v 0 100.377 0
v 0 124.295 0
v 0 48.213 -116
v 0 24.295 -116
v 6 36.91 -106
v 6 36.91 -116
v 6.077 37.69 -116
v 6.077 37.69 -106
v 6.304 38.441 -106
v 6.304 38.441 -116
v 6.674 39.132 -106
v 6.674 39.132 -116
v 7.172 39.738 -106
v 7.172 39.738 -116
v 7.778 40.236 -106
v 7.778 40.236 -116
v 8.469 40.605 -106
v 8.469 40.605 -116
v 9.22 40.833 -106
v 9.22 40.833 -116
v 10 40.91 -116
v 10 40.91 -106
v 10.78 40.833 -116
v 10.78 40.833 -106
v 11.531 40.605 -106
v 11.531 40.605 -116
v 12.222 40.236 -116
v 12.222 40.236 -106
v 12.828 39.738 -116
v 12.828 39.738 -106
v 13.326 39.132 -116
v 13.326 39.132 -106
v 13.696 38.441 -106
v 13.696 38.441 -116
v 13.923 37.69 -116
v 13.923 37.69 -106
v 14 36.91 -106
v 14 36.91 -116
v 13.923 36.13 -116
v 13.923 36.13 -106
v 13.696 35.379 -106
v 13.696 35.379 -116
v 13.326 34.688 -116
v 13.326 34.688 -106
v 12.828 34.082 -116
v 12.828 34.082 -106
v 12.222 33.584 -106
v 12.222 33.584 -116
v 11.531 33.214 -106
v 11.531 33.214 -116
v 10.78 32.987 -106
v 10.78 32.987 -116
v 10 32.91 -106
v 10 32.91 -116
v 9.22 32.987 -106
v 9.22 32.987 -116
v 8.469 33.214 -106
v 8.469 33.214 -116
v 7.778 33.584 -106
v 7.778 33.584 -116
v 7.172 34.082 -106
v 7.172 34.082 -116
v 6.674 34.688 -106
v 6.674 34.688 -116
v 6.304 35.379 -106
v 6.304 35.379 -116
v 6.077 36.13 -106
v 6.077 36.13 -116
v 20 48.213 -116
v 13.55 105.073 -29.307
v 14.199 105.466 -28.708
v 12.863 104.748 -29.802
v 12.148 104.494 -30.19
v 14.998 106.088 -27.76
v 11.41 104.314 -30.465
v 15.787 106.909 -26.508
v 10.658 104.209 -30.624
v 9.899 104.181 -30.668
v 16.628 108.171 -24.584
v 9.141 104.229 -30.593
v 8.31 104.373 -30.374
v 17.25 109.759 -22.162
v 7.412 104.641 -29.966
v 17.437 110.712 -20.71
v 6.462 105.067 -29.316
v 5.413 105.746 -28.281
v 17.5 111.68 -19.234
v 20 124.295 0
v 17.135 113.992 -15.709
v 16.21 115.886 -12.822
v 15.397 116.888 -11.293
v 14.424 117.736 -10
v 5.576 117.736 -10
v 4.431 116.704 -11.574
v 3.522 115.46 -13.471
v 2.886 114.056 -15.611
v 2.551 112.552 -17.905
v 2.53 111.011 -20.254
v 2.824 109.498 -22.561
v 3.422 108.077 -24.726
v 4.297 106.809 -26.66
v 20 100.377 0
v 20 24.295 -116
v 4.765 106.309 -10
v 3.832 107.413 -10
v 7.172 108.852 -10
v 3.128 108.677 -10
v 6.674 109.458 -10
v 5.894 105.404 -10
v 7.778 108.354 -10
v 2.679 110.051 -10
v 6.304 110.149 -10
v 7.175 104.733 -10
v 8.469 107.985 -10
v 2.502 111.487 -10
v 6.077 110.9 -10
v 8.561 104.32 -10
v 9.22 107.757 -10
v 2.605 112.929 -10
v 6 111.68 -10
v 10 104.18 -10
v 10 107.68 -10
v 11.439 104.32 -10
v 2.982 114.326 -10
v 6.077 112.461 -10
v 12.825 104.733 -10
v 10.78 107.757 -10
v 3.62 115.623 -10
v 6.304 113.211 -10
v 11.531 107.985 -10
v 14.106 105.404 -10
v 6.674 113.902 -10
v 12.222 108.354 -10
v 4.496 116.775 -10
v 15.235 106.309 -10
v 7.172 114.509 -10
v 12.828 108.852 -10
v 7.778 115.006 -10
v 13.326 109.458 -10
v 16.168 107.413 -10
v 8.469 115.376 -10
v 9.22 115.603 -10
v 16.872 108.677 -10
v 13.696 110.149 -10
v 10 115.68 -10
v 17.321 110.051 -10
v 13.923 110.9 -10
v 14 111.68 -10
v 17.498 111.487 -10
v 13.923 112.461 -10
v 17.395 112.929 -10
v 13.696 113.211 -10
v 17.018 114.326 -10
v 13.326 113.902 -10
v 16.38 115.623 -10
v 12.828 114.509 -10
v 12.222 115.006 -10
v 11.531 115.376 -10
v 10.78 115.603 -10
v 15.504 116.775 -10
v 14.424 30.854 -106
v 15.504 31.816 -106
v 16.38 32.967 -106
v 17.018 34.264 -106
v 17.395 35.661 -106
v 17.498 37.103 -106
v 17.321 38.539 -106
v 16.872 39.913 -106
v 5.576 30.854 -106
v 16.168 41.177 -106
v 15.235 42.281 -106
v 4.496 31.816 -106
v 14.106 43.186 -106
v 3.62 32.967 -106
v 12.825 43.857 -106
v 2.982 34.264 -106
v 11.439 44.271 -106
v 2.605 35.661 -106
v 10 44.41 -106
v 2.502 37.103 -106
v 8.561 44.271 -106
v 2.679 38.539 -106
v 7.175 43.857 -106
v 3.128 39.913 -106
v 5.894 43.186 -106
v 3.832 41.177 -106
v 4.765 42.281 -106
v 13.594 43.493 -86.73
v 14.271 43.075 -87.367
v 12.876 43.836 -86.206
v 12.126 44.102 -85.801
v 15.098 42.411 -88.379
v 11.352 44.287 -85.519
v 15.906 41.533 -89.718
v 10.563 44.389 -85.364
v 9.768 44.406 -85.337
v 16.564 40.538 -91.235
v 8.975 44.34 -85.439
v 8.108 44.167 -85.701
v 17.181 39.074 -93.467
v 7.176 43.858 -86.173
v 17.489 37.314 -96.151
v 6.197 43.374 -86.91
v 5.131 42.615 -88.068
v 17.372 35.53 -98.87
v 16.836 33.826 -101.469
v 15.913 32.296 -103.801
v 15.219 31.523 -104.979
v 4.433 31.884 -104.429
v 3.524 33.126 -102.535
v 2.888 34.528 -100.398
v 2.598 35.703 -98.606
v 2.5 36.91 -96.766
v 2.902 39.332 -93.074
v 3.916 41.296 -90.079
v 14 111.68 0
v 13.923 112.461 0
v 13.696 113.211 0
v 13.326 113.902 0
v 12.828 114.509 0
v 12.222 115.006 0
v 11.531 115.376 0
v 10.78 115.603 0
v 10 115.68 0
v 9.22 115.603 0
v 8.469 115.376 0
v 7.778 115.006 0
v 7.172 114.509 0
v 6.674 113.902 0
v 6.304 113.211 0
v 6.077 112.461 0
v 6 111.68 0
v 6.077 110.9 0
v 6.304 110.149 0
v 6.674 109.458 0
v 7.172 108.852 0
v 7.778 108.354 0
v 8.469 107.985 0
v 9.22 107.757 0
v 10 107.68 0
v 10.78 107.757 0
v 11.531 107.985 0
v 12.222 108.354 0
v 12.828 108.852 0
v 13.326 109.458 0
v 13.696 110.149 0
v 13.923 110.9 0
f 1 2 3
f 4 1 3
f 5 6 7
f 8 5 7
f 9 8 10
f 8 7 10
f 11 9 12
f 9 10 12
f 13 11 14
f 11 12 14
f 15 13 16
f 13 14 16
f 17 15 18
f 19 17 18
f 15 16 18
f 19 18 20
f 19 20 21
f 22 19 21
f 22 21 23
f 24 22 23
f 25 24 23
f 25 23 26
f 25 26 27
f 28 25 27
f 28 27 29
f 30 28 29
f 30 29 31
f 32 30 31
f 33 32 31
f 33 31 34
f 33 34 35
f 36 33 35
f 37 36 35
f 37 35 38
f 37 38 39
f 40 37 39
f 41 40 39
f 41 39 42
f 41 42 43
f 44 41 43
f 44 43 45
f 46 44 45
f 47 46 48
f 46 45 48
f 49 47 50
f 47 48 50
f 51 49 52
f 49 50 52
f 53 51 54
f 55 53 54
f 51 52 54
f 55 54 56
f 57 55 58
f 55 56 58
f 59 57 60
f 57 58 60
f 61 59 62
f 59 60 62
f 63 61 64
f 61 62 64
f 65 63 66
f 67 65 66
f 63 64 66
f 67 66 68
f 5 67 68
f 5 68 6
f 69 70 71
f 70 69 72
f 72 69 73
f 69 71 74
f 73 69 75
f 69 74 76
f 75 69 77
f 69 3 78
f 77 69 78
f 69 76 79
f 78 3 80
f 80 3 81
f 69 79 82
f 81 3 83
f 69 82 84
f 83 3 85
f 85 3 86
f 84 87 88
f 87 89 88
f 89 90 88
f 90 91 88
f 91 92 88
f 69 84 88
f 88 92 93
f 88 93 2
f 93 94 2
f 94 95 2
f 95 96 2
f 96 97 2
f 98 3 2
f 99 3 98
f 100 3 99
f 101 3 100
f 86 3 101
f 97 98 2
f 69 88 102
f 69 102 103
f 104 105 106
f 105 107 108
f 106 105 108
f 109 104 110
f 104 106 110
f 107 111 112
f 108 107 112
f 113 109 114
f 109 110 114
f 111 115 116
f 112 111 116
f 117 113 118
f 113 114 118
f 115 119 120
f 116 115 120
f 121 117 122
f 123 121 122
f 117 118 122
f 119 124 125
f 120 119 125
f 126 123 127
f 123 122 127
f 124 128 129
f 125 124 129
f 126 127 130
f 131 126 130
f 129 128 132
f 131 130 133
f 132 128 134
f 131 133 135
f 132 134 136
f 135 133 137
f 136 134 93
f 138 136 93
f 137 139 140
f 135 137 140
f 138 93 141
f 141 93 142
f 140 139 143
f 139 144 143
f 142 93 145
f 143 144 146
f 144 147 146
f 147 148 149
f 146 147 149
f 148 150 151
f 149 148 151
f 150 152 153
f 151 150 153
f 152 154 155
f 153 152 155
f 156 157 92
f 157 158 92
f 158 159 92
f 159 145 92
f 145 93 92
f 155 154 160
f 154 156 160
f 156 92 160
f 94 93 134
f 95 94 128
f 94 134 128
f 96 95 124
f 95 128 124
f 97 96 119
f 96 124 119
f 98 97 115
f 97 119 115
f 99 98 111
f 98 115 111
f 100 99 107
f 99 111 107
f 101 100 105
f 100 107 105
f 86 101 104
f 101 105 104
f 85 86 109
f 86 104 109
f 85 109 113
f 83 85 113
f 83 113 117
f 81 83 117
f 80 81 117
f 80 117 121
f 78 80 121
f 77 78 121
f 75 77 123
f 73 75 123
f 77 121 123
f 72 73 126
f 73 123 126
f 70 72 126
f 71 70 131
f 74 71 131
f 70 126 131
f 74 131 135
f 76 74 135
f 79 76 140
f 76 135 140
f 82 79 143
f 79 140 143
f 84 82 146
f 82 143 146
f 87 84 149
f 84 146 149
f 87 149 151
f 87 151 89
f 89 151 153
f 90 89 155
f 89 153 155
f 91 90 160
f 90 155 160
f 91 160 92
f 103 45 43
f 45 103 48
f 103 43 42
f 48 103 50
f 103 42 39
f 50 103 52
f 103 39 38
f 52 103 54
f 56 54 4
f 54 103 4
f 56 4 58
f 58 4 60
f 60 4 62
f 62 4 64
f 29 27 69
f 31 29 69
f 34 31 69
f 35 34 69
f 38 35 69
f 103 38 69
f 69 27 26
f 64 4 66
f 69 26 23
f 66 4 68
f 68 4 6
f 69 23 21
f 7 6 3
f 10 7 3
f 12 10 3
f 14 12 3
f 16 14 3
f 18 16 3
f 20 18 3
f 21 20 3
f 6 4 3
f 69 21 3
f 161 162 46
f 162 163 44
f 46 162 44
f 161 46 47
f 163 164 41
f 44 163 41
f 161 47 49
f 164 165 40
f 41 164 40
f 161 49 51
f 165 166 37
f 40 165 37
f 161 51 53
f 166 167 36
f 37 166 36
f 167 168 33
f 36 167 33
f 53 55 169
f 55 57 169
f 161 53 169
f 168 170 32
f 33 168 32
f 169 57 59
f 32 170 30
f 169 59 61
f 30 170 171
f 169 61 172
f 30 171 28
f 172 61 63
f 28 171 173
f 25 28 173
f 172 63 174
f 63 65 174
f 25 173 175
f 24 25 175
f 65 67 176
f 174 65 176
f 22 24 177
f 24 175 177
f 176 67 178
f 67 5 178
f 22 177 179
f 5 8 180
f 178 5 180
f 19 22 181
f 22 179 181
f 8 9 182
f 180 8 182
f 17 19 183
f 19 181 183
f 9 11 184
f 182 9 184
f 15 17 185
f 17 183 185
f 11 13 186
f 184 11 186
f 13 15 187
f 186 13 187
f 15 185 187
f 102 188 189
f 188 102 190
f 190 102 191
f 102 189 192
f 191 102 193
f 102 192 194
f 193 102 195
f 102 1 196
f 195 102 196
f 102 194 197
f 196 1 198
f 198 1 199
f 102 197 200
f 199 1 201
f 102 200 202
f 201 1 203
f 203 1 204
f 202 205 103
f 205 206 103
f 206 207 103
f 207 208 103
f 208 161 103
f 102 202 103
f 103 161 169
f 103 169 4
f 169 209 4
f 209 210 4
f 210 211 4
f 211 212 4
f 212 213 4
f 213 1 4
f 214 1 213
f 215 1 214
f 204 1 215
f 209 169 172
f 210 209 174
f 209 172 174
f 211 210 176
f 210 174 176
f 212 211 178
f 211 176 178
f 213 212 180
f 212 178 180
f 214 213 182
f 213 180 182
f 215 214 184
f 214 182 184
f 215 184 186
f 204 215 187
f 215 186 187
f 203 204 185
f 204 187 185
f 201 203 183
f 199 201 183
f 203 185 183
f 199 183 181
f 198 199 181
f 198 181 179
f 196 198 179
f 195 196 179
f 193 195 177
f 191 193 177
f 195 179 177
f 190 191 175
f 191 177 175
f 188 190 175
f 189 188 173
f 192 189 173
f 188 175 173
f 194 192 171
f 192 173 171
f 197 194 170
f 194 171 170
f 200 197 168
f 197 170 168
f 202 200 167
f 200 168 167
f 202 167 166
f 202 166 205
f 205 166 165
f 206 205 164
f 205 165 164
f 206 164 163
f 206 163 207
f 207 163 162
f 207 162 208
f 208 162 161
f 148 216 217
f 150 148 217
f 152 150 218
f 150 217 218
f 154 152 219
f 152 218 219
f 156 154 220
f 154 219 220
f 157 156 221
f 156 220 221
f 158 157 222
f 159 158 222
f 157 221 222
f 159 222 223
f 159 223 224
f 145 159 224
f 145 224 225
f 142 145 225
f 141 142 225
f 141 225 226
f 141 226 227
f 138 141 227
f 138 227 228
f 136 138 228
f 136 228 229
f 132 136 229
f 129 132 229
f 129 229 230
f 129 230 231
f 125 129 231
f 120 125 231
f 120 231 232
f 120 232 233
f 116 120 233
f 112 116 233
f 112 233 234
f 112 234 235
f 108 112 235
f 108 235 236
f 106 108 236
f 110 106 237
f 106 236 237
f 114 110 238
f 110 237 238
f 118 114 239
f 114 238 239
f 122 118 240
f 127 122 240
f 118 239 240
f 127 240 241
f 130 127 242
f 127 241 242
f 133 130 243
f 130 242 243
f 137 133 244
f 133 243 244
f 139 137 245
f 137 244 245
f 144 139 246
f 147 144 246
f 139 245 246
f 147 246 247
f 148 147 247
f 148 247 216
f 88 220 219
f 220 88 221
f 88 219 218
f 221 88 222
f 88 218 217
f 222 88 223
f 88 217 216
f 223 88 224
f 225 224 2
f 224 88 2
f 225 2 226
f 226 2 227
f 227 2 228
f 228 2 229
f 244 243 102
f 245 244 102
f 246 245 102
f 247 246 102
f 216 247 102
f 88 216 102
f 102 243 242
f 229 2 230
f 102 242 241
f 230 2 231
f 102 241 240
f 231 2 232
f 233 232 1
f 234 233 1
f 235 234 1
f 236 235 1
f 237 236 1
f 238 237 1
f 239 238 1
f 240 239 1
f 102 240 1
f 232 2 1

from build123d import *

# Parameters (mm, degrees)
BOSS_EXTRUDE1_DEPTH = 20
SKETCH2_R           = 4
CUT_EXTRUDE5_DEPTH  = 117
CUT_EXTRUDE6_START  = -10
SKETCH5_R           = 7.5
CUT_EXTRUDE6_DEPTH  = 107
SKETCH6_R           = 4
CUT_EXTRUDE7_DEPTH  = 117
CUT_EXTRUDE8_START  = -10
SKETCH7_R           = 7.5
CUT_EXTRUDE8_DEPTH  = 107


with BuildPart() as part:
    # Sketch1 → Boss-Extrude1 (new body)
    with BuildSketch(Plane(origin=(0, 0, 0), x_dir=(0, 0, -1), z_dir=(1, 0, 0))):
        Polygon((116, 48.213061677), (0, 124.295055109), (0, 100.377048541), (116, 24.295055109), align=None)
    extrude(amount=BOSS_EXTRUDE1_DEPTH)

    # Sketch2 → Cut-Extrude5 (cut, through all)
    with BuildSketch(Plane.XY):
        with Locations((10, 111.680172571)):
            Circle(SKETCH2_R)
    extrude(amount=-CUT_EXTRUDE5_DEPTH, mode=Mode.SUBTRACT)

    # Sketch5 → Cut-Extrude6 (cut, through all)
    with BuildSketch(Plane.XY.offset(CUT_EXTRUDE6_START)):
        with Locations((10, 111.680172571)):
            Circle(SKETCH5_R)
    extrude(amount=-CUT_EXTRUDE6_DEPTH, mode=Mode.SUBTRACT)

    # Sketch6 → Cut-Extrude7 (cut, through all)
    with BuildSketch(Plane(origin=(0, 0, -116), x_dir=(-1, 0, 0), z_dir=(0, 0, -1))):
        with Locations((-10, 36.909937646)):
            Circle(SKETCH6_R)
    extrude(amount=-CUT_EXTRUDE7_DEPTH, mode=Mode.SUBTRACT)

    # Sketch7 → Cut-Extrude8 (cut, through all)
    with BuildSketch(Plane(origin=(0, 0, -116), x_dir=(-1, 0, 0), z_dir=(0, 0, -1)).offset(CUT_EXTRUDE8_START)):
        with Locations((-10, 36.909937646)):
            Circle(SKETCH7_R)
    extrude(amount=-CUT_EXTRUDE8_DEPTH, mode=Mode.SUBTRACT)


solid = part.part
